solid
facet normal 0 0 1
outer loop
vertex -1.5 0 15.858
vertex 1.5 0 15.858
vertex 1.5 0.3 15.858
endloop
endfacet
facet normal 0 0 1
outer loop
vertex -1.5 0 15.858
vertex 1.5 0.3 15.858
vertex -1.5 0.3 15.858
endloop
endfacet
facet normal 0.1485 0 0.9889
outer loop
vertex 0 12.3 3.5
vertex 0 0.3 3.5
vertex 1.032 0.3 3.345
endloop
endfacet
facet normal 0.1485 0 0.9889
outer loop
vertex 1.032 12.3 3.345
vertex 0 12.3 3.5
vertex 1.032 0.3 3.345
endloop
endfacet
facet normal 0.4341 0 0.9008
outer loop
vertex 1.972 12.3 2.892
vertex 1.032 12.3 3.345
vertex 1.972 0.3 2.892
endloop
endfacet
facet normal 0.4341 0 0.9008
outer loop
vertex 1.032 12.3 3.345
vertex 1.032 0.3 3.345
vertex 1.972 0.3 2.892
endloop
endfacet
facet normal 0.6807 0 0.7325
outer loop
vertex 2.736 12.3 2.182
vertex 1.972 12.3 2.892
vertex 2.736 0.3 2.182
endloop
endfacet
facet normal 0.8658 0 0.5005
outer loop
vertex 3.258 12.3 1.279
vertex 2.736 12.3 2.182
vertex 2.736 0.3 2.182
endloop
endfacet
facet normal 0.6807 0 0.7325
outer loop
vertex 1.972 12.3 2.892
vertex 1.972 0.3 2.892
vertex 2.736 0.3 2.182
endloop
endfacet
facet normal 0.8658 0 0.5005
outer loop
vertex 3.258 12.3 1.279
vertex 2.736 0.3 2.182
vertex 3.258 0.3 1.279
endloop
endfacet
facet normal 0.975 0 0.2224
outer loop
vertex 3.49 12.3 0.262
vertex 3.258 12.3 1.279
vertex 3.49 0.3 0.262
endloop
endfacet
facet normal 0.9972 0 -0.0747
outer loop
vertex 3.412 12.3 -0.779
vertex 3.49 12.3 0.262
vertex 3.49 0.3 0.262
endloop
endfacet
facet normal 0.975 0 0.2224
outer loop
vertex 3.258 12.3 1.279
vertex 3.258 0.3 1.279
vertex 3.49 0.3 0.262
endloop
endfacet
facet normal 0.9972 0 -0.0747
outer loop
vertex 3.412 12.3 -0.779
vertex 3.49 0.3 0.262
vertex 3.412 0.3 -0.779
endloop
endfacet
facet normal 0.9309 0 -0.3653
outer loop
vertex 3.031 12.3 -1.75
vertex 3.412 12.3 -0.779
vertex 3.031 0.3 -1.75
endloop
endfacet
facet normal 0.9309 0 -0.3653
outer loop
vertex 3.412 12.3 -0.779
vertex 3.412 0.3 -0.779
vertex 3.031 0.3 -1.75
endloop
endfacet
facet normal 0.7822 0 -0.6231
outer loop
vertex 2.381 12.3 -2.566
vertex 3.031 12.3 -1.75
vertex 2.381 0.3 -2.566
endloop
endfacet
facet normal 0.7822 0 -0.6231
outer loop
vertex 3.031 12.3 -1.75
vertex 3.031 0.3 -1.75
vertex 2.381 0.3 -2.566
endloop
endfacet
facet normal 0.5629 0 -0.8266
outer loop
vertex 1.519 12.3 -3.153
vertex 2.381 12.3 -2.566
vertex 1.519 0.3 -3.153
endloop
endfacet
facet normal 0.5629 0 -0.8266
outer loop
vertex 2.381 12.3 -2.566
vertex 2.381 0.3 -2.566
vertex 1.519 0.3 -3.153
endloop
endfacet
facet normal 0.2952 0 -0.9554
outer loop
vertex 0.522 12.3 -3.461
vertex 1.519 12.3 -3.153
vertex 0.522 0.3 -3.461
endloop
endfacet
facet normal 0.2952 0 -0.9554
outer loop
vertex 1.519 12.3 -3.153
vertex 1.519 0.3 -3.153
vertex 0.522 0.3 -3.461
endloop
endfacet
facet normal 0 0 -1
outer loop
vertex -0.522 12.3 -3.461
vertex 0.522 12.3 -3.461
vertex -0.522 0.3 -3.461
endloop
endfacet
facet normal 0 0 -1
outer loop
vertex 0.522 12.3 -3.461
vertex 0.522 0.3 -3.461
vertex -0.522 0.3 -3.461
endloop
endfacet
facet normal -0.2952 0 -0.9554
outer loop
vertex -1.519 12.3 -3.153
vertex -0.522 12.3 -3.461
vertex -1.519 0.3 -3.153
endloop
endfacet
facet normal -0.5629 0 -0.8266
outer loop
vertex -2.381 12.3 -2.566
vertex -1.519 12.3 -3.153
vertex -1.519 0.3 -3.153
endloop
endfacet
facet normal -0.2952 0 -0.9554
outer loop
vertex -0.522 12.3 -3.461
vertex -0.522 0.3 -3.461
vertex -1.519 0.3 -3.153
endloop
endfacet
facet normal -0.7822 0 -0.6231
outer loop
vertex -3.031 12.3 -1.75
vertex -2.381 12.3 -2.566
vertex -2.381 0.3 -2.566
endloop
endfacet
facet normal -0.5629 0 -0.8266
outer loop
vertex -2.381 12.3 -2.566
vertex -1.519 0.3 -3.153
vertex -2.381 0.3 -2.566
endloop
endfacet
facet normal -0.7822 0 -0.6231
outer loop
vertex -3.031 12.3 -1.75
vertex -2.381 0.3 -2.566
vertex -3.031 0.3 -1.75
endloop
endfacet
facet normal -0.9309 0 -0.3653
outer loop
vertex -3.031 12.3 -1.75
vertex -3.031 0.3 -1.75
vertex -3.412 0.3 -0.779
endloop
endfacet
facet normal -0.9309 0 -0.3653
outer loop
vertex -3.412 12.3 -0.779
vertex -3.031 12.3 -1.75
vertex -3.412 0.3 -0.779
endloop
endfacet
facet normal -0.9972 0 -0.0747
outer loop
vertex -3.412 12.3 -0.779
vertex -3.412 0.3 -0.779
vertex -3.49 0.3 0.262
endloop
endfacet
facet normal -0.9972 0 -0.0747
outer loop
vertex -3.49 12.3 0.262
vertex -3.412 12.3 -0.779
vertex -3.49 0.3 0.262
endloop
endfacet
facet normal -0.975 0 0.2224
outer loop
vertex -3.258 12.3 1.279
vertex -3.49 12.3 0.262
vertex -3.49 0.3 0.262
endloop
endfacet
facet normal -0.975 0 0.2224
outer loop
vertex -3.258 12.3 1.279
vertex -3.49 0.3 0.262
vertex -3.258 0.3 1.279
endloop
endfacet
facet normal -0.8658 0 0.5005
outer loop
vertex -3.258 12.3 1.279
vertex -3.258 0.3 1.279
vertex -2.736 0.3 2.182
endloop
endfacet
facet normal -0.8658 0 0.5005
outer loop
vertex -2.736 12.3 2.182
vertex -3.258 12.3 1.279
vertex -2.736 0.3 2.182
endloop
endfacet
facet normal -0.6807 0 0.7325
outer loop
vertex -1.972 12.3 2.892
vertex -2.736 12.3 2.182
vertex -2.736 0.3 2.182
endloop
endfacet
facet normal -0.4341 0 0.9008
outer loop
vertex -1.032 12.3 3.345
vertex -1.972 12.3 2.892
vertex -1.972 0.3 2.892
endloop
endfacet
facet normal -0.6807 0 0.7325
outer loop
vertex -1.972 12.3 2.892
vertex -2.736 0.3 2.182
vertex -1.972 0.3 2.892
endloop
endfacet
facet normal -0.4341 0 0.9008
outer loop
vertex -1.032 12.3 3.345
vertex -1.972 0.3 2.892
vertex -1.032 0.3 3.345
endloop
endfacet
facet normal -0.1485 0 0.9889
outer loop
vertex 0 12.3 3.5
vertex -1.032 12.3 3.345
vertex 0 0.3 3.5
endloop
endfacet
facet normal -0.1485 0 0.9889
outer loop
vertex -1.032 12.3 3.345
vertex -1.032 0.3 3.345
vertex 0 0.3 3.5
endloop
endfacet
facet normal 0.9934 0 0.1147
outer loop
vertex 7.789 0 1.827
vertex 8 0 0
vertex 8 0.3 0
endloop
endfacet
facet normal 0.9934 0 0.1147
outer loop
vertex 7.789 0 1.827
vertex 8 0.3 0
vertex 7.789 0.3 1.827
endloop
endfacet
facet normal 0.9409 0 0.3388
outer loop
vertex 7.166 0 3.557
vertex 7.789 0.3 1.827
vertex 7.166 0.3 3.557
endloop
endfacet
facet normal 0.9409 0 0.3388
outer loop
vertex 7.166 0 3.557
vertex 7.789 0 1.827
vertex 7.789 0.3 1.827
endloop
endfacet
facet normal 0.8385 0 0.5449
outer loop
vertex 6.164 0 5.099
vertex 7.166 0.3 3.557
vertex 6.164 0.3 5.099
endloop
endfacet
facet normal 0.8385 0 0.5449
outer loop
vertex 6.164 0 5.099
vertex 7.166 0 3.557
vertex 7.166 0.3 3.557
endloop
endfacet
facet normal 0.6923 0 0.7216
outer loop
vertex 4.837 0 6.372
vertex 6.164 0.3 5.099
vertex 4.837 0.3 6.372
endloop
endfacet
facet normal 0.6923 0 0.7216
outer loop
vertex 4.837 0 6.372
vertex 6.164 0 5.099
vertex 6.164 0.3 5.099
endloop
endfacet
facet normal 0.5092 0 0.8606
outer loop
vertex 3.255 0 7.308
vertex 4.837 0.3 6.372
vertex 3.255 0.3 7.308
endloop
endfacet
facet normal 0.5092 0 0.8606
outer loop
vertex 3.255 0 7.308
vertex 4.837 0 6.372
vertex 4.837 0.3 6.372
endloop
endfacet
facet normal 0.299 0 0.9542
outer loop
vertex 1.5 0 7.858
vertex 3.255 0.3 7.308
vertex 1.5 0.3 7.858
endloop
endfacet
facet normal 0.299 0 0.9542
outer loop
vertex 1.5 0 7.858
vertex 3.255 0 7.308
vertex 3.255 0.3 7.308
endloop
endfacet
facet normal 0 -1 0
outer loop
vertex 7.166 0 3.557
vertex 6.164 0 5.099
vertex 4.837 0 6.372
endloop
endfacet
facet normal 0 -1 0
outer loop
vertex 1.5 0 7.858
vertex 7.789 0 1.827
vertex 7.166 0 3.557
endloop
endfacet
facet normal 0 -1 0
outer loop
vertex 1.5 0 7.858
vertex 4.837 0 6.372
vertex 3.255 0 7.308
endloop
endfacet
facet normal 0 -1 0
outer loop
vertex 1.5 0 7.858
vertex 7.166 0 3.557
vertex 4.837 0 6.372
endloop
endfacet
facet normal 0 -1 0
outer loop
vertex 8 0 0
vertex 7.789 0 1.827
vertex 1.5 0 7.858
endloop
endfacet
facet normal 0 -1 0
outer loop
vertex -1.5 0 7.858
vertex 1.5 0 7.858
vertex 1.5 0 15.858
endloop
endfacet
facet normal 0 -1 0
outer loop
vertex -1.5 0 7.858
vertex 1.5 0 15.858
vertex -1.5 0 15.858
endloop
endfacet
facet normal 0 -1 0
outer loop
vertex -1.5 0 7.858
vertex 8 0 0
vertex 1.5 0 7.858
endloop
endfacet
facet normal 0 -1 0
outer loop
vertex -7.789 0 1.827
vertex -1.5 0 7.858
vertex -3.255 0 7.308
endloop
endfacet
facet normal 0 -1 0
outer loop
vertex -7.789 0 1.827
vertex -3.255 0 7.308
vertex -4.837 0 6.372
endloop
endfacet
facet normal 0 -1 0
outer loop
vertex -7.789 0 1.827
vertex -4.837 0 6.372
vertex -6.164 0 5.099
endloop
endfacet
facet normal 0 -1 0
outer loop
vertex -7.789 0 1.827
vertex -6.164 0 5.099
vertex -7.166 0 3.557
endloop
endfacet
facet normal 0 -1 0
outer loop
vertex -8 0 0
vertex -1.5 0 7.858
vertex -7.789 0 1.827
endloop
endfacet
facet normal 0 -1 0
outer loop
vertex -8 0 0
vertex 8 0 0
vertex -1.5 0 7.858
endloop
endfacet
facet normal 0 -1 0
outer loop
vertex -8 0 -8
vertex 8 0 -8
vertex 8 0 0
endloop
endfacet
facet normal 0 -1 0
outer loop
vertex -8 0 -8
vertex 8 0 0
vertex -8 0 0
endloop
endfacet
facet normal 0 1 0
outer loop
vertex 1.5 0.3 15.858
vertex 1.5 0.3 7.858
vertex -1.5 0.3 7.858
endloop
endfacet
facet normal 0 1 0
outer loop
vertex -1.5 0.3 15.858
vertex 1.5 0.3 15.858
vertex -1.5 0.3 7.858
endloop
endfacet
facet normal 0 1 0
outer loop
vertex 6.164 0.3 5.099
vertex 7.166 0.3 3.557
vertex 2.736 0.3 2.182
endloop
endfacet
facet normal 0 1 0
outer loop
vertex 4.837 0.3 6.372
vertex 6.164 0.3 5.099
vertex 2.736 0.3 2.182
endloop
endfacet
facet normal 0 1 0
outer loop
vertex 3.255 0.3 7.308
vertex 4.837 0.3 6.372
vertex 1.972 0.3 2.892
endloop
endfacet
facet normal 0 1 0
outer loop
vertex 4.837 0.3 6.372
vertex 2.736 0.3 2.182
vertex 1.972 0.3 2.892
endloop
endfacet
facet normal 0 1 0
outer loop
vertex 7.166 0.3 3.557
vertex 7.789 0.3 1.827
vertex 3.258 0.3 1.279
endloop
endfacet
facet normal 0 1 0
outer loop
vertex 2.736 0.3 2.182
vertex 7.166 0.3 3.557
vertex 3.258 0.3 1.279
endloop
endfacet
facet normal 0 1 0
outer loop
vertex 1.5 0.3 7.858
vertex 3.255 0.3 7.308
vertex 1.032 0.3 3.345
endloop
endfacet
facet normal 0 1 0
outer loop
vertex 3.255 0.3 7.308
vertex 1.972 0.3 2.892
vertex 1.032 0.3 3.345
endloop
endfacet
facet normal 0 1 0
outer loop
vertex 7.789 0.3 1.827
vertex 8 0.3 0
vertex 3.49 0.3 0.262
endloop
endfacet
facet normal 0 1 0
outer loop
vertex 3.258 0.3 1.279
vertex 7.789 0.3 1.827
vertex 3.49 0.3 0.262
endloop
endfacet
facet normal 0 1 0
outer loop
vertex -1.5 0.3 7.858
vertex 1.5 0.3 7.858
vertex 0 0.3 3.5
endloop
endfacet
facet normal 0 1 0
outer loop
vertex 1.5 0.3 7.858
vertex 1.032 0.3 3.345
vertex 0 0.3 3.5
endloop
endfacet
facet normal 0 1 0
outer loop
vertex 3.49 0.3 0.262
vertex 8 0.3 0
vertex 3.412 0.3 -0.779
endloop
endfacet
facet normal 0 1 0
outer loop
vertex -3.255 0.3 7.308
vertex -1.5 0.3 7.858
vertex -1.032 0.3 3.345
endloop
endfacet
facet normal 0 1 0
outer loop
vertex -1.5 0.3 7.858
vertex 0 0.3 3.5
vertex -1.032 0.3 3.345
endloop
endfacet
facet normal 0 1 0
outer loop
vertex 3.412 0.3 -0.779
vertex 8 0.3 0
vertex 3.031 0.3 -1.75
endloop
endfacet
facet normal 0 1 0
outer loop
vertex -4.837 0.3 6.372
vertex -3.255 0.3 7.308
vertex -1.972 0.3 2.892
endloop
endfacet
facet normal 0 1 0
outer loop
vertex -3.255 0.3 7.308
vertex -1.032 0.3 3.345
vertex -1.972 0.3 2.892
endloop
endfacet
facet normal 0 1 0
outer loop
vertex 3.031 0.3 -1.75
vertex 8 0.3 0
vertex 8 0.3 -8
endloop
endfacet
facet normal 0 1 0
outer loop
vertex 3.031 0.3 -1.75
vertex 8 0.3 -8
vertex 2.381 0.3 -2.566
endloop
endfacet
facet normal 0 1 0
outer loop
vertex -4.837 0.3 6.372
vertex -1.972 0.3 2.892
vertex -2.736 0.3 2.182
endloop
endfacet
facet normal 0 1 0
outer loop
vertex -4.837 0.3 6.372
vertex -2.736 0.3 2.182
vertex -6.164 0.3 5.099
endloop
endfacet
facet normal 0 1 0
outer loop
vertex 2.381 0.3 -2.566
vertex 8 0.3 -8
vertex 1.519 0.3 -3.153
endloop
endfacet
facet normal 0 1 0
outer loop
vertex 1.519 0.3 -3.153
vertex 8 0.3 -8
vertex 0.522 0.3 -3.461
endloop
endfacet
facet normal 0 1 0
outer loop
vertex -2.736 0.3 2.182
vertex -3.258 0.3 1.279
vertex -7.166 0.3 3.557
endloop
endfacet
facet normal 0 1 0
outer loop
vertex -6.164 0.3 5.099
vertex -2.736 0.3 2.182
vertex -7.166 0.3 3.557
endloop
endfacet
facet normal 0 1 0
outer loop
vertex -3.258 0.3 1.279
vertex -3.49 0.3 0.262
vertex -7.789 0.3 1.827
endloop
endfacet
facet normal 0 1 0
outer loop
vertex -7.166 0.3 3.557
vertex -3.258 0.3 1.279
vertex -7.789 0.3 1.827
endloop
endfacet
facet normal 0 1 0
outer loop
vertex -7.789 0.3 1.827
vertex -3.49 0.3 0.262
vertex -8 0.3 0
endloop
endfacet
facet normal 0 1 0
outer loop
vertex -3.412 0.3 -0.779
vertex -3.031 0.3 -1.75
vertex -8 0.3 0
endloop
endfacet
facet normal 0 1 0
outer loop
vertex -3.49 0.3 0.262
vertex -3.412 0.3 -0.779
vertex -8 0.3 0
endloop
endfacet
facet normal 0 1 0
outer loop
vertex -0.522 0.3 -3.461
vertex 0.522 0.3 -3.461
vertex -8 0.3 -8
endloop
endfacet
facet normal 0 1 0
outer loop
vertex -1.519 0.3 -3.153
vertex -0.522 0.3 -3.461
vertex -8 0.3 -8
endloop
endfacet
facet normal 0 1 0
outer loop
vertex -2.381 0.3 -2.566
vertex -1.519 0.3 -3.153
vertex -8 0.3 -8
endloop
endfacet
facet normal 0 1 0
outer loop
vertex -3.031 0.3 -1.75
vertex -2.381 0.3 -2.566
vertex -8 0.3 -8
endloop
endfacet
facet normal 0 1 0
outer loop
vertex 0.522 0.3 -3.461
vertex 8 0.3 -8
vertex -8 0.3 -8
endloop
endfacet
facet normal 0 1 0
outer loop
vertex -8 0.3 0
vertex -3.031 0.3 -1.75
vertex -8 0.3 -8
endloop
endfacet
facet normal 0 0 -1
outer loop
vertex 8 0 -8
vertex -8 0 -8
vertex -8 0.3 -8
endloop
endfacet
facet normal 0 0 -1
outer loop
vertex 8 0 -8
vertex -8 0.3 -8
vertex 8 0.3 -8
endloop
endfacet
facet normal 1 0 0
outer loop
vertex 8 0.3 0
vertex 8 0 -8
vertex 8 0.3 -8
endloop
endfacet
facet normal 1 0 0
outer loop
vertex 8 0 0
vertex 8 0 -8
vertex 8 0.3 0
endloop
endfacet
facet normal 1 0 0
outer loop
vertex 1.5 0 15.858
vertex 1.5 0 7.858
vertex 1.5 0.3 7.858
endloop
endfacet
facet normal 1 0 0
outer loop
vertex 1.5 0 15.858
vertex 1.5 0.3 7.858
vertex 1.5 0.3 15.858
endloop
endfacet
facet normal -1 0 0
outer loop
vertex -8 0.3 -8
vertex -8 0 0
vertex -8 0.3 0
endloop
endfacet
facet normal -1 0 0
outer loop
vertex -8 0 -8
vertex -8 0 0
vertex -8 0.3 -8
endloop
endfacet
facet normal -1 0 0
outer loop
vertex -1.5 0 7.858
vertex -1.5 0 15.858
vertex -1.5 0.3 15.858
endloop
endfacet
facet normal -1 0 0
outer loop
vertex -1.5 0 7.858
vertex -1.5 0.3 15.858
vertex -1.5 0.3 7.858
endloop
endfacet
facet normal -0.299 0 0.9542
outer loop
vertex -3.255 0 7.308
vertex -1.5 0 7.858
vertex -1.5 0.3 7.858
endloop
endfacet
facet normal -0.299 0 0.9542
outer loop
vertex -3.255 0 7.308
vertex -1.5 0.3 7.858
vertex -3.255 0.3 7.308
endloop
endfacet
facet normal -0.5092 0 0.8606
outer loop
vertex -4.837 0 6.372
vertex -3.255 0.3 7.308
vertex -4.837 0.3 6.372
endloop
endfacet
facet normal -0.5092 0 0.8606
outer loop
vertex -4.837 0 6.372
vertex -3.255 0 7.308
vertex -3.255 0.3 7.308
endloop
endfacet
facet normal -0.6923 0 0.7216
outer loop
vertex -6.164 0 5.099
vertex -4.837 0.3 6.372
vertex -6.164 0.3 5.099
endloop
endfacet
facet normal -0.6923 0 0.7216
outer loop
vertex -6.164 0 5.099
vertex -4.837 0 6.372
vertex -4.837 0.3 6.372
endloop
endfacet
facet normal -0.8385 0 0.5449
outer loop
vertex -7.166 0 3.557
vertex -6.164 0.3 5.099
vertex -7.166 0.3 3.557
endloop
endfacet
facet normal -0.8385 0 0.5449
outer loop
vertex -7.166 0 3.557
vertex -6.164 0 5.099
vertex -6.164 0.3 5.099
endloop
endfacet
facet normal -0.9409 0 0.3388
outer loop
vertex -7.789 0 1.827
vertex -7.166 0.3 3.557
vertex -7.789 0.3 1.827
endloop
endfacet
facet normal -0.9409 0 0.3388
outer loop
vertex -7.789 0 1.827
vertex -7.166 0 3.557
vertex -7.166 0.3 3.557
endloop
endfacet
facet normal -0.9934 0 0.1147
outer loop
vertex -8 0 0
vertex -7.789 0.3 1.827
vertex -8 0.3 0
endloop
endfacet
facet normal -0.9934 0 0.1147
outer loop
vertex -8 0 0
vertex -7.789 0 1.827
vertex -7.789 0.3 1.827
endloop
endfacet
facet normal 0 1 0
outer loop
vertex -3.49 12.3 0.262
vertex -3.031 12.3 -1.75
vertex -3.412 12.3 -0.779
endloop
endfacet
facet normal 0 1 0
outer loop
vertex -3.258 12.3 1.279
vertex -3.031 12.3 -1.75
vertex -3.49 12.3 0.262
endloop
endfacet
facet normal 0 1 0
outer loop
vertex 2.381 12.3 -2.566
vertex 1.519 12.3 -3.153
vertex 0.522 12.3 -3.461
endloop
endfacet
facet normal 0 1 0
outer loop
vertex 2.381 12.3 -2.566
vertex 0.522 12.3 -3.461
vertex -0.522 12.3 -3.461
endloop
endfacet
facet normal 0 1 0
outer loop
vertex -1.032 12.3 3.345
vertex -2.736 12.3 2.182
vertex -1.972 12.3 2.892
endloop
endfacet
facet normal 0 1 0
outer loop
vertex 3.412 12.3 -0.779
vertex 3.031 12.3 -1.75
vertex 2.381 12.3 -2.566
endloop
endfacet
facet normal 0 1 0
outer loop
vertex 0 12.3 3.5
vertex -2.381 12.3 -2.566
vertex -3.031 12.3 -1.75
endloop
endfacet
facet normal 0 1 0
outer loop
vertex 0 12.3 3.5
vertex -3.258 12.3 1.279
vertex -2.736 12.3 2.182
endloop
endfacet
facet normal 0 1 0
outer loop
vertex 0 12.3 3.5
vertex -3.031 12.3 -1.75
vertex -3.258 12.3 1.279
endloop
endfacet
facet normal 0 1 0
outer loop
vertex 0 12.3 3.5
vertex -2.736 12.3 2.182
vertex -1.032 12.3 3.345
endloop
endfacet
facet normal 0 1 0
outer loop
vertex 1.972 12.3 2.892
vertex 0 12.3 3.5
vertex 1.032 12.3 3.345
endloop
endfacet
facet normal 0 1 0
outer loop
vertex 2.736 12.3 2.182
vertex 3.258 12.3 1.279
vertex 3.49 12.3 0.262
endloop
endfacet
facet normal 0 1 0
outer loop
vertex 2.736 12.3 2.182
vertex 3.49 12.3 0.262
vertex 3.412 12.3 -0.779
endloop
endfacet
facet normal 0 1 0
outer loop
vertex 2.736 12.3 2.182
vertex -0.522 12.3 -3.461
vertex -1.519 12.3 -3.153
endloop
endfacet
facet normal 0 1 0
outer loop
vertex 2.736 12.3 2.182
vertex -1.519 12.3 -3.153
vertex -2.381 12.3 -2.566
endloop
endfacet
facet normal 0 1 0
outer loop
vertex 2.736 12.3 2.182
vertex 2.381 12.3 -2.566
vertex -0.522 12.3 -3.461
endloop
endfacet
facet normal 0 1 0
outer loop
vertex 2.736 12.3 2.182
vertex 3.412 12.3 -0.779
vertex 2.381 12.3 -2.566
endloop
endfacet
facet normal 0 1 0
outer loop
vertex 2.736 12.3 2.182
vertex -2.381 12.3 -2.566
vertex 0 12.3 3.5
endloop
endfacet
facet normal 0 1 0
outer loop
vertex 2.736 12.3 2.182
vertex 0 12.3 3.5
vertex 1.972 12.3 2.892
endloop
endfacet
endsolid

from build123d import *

# Parameters (mm, degrees)
EXTRUDE_1_DEPTH = 0.3
SKETCH_2_R      = 3.5
EXTRUDE_2_DEPTH = 12


with BuildPart() as part:
    # 草图1 → 凸台-拉伸1 (new body)
    with BuildSketch(Plane(origin=(0, 0, 0), x_dir=(1, 0, 0), z_dir=(0, 1, 0))):
        with BuildLine():
            Line((-8, 0), (-8, 8))
            Line((-8, 8), (8, 8))
            Line((8, 8), (8, 0))
            ThreePointArc((8, 0), (6.164414003, -5.099019514), (1.5, -7.858116823))
            Line((1.5, -7.858116823), (1.5, -15.858116823))
            Line((1.5, -15.858116823), (-1.5, -15.858116823))
            Line((-1.5, -15.858116823), (-1.5, -7.858116823))
            ThreePointArc((-1.5, -7.858116823), (-6.164414003, -5.099019514), (-8, 0))
        make_face()
    extrude(amount=EXTRUDE_1_DEPTH)

    # 草图2 → 凸台-拉伸2 (add)
    with BuildSketch(Plane(origin=(0, 0.3, 0), x_dir=(1, 0, 0), z_dir=(0, 1, 0))):
        with Locations(Location((0, 0, 0), (0, 0, 270))):
            Circle(SKETCH_2_R)
    extrude(amount=EXTRUDE_2_DEPTH)


solid = part.part
